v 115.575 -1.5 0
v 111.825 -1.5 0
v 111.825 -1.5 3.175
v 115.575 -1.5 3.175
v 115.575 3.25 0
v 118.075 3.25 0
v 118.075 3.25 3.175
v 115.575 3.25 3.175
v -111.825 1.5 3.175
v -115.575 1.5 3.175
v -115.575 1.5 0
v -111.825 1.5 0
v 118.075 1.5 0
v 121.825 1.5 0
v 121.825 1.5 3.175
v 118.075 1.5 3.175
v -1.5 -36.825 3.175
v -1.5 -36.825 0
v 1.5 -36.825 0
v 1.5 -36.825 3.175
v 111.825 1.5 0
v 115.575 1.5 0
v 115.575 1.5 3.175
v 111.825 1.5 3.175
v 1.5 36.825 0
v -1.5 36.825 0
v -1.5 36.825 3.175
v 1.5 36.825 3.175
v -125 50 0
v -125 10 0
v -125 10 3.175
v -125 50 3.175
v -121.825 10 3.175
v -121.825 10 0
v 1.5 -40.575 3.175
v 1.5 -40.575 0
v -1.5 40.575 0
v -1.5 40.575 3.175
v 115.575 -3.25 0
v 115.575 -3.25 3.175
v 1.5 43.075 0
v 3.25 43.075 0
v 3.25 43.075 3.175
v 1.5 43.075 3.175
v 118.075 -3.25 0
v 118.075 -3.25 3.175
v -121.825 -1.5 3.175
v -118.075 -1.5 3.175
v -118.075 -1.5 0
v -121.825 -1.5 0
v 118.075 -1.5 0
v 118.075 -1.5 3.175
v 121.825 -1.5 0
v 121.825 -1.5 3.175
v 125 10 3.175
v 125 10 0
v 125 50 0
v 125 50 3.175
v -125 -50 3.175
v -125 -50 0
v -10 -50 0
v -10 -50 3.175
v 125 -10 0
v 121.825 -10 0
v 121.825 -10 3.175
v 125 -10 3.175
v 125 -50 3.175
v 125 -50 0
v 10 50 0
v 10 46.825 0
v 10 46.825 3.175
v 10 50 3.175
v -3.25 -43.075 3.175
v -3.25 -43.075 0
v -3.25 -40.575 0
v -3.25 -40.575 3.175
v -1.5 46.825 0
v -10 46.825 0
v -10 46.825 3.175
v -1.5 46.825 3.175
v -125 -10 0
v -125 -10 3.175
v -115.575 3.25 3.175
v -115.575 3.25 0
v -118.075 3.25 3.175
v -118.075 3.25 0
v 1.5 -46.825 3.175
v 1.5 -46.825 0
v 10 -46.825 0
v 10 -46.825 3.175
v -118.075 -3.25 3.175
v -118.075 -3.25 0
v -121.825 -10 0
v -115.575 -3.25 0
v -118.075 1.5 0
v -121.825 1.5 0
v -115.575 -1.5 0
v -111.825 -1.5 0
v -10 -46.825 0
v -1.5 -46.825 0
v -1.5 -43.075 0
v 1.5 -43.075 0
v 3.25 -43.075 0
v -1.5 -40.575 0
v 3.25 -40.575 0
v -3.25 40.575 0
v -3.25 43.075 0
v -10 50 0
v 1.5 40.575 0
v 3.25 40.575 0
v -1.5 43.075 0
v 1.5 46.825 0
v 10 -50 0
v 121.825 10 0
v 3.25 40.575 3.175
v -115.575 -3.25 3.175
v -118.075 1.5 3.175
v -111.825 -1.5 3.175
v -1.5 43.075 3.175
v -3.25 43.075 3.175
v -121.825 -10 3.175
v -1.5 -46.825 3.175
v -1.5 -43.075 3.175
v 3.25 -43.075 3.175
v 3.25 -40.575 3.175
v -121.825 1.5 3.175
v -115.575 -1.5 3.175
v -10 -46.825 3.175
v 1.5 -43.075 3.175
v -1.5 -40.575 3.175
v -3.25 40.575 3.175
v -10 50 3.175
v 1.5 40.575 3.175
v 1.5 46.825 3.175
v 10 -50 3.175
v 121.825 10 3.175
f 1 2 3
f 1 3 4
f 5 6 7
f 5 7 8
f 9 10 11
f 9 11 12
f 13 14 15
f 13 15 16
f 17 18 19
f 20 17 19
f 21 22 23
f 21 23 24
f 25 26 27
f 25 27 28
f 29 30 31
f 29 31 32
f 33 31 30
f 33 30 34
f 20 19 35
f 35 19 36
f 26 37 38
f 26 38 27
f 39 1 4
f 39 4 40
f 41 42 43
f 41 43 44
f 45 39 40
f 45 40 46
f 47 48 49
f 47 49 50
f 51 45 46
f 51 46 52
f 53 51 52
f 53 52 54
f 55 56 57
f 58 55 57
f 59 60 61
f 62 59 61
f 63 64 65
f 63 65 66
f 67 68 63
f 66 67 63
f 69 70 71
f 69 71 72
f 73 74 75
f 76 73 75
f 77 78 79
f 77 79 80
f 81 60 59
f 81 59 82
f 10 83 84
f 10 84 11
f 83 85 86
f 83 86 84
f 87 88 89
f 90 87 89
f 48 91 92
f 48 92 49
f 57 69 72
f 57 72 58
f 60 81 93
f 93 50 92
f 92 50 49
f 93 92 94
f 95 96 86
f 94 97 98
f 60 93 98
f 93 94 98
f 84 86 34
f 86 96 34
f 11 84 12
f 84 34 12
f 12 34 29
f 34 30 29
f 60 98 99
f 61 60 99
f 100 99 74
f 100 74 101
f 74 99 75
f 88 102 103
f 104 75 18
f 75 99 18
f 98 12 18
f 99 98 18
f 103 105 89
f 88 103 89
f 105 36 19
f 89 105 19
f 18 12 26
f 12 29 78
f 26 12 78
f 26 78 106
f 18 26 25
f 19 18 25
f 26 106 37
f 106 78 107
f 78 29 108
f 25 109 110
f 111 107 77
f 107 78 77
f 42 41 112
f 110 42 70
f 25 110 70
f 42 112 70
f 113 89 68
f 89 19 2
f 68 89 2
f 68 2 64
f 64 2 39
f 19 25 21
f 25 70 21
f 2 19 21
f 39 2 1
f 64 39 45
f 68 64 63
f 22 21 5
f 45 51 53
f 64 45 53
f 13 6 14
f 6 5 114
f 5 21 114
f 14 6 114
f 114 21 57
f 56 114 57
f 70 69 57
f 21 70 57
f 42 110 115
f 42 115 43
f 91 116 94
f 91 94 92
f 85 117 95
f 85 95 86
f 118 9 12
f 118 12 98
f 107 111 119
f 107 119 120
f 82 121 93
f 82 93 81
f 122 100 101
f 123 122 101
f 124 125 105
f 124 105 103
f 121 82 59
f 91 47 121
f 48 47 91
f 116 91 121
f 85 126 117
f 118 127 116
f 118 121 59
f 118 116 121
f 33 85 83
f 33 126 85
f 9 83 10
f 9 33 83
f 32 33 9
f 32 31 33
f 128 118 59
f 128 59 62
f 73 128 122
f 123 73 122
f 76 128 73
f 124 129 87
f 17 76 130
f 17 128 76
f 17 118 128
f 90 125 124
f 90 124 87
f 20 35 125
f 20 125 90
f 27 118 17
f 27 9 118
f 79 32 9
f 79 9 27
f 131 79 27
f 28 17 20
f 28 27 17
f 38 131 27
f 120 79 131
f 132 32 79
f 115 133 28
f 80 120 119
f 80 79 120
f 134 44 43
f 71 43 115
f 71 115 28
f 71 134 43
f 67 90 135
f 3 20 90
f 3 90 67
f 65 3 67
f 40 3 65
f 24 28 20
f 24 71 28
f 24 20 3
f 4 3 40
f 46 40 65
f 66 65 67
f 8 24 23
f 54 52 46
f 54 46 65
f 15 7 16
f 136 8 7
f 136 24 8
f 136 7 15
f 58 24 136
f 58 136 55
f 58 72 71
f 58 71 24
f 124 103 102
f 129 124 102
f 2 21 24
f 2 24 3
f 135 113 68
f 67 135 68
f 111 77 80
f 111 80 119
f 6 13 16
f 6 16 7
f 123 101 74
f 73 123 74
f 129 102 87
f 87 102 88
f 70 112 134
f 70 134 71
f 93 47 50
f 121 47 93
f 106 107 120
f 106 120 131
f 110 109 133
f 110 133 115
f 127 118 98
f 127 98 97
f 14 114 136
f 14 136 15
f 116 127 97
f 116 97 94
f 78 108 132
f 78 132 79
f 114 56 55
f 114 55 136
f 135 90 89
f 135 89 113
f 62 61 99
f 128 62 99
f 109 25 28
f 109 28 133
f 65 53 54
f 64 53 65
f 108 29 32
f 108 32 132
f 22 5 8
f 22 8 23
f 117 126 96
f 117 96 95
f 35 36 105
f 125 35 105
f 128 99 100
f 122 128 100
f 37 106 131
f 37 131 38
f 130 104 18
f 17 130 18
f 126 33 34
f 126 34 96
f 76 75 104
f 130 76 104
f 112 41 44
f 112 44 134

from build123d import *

# Parameters (mm, degrees)
SKETCH1_W           = 250
SKETCH1_H           = 100
BOSS_EXTRUDE1_DEPTH = 3.175
T_CUT_DEPTH         = 142.561231774
T_CUT2_DEPTH        = 149.1205851
T_CUT3_DEPTH        = 143.57254352


with BuildPart() as part:
    # Sketch1 → Boss-Extrude1 (new body)
    with BuildSketch(Plane.XY):
        Rectangle(SKETCH1_W, SKETCH1_H)
    extrude(amount=BOSS_EXTRUDE1_DEPTH)

    # Sketch3 → T Cut (cut, through all)
    with BuildSketch(Plane(origin=(2.435372351, -11.560763397, 0), x_dir=(-1, 0, 0), z_dir=(0, 0, -1))):
        Polygon((-122.564627649, 1.560763397), (-122.564627649, 21.560763397), (-119.389627649, 21.560763397), (-119.389627649, 13.060763397), (-115.639627649, 13.060763397), (-115.639627649, 14.810763397), (-113.139627649, 14.810763397), (-113.139627649, 13.060763397), (-109.389627649, 13.060763397), (-109.389627649, 10.060763397), (-113.139627649, 10.060763397), (-113.139627649, 8.310763397), (-115.639627649, 8.310763397), (-115.639627649, 10.060763397), (-119.389627649, 10.060763397), (-119.389627649, 1.560763397), align=None)
    extrude(amount=-T_CUT_DEPTH, mode=Mode.SUBTRACT)

    # Sketch32 → T Cut2 (cut, through all)
    with BuildSketch(Plane(origin=(-11.542281755, -7.322180687, 3.175), x_dir=(1, 0, 0), z_dir=(0, 0, 1))):
        Polygon((-113.457718245, -2.677819313), (-113.457718245, 17.322180687), (-110.282718245, 17.322180687), (-110.282718245, 8.822180687), (-106.532718245, 8.822180687), (-106.532718245, 10.572180687), (-104.032718245, 10.572180687), (-104.032718245, 8.822180687), (-100.282718245, 8.822180687), (-100.282718245, 5.822180687), (-104.032718245, 5.822180687), (-104.032718245, 4.072180687), (-106.532718245, 4.072180687), (-106.532718245, 5.822180687), (-110.282718245, 5.822180687), (-110.282718245, -2.677819313), align=None)
    extrude(amount=-T_CUT2_DEPTH, mode=Mode.SUBTRACT)

    # Sketch33 → T Cut3 (cut, through all)
    with BuildSketch(Plane(origin=(-8.380029994, 0.26546667, 0), x_dir=(-1, 0, 0), z_dir=(0, 0, -1))):
        Polygon((-18.380029994, 49.73453333), (1.619970006, 49.73453333), (1.619970006, 46.55953333), (-6.880029994, 46.55953333), (-6.880029994, 42.80953333), (-5.130029994, 42.80953333), (-5.130029994, 40.30953333), (-6.880029994, 40.30953333), (-6.880029994, 36.55953333), (-9.880029994, 36.55953333), (-9.880029994, 40.30953333), (-11.630029994, 40.30953333), (-11.630029994, 42.80953333), (-9.880029994, 42.80953333), (-9.880029994, 46.55953333), (-18.380029994, 46.55953333), align=None)
    t_cut3 = extrude(amount=-T_CUT3_DEPTH, mode=Mode.SUBTRACT)

    # Mirror2: T Cut3 across plane
    add(t_cut3.mirror(Plane.ZX), mode=Mode.SUBTRACT)


solid = part.part
